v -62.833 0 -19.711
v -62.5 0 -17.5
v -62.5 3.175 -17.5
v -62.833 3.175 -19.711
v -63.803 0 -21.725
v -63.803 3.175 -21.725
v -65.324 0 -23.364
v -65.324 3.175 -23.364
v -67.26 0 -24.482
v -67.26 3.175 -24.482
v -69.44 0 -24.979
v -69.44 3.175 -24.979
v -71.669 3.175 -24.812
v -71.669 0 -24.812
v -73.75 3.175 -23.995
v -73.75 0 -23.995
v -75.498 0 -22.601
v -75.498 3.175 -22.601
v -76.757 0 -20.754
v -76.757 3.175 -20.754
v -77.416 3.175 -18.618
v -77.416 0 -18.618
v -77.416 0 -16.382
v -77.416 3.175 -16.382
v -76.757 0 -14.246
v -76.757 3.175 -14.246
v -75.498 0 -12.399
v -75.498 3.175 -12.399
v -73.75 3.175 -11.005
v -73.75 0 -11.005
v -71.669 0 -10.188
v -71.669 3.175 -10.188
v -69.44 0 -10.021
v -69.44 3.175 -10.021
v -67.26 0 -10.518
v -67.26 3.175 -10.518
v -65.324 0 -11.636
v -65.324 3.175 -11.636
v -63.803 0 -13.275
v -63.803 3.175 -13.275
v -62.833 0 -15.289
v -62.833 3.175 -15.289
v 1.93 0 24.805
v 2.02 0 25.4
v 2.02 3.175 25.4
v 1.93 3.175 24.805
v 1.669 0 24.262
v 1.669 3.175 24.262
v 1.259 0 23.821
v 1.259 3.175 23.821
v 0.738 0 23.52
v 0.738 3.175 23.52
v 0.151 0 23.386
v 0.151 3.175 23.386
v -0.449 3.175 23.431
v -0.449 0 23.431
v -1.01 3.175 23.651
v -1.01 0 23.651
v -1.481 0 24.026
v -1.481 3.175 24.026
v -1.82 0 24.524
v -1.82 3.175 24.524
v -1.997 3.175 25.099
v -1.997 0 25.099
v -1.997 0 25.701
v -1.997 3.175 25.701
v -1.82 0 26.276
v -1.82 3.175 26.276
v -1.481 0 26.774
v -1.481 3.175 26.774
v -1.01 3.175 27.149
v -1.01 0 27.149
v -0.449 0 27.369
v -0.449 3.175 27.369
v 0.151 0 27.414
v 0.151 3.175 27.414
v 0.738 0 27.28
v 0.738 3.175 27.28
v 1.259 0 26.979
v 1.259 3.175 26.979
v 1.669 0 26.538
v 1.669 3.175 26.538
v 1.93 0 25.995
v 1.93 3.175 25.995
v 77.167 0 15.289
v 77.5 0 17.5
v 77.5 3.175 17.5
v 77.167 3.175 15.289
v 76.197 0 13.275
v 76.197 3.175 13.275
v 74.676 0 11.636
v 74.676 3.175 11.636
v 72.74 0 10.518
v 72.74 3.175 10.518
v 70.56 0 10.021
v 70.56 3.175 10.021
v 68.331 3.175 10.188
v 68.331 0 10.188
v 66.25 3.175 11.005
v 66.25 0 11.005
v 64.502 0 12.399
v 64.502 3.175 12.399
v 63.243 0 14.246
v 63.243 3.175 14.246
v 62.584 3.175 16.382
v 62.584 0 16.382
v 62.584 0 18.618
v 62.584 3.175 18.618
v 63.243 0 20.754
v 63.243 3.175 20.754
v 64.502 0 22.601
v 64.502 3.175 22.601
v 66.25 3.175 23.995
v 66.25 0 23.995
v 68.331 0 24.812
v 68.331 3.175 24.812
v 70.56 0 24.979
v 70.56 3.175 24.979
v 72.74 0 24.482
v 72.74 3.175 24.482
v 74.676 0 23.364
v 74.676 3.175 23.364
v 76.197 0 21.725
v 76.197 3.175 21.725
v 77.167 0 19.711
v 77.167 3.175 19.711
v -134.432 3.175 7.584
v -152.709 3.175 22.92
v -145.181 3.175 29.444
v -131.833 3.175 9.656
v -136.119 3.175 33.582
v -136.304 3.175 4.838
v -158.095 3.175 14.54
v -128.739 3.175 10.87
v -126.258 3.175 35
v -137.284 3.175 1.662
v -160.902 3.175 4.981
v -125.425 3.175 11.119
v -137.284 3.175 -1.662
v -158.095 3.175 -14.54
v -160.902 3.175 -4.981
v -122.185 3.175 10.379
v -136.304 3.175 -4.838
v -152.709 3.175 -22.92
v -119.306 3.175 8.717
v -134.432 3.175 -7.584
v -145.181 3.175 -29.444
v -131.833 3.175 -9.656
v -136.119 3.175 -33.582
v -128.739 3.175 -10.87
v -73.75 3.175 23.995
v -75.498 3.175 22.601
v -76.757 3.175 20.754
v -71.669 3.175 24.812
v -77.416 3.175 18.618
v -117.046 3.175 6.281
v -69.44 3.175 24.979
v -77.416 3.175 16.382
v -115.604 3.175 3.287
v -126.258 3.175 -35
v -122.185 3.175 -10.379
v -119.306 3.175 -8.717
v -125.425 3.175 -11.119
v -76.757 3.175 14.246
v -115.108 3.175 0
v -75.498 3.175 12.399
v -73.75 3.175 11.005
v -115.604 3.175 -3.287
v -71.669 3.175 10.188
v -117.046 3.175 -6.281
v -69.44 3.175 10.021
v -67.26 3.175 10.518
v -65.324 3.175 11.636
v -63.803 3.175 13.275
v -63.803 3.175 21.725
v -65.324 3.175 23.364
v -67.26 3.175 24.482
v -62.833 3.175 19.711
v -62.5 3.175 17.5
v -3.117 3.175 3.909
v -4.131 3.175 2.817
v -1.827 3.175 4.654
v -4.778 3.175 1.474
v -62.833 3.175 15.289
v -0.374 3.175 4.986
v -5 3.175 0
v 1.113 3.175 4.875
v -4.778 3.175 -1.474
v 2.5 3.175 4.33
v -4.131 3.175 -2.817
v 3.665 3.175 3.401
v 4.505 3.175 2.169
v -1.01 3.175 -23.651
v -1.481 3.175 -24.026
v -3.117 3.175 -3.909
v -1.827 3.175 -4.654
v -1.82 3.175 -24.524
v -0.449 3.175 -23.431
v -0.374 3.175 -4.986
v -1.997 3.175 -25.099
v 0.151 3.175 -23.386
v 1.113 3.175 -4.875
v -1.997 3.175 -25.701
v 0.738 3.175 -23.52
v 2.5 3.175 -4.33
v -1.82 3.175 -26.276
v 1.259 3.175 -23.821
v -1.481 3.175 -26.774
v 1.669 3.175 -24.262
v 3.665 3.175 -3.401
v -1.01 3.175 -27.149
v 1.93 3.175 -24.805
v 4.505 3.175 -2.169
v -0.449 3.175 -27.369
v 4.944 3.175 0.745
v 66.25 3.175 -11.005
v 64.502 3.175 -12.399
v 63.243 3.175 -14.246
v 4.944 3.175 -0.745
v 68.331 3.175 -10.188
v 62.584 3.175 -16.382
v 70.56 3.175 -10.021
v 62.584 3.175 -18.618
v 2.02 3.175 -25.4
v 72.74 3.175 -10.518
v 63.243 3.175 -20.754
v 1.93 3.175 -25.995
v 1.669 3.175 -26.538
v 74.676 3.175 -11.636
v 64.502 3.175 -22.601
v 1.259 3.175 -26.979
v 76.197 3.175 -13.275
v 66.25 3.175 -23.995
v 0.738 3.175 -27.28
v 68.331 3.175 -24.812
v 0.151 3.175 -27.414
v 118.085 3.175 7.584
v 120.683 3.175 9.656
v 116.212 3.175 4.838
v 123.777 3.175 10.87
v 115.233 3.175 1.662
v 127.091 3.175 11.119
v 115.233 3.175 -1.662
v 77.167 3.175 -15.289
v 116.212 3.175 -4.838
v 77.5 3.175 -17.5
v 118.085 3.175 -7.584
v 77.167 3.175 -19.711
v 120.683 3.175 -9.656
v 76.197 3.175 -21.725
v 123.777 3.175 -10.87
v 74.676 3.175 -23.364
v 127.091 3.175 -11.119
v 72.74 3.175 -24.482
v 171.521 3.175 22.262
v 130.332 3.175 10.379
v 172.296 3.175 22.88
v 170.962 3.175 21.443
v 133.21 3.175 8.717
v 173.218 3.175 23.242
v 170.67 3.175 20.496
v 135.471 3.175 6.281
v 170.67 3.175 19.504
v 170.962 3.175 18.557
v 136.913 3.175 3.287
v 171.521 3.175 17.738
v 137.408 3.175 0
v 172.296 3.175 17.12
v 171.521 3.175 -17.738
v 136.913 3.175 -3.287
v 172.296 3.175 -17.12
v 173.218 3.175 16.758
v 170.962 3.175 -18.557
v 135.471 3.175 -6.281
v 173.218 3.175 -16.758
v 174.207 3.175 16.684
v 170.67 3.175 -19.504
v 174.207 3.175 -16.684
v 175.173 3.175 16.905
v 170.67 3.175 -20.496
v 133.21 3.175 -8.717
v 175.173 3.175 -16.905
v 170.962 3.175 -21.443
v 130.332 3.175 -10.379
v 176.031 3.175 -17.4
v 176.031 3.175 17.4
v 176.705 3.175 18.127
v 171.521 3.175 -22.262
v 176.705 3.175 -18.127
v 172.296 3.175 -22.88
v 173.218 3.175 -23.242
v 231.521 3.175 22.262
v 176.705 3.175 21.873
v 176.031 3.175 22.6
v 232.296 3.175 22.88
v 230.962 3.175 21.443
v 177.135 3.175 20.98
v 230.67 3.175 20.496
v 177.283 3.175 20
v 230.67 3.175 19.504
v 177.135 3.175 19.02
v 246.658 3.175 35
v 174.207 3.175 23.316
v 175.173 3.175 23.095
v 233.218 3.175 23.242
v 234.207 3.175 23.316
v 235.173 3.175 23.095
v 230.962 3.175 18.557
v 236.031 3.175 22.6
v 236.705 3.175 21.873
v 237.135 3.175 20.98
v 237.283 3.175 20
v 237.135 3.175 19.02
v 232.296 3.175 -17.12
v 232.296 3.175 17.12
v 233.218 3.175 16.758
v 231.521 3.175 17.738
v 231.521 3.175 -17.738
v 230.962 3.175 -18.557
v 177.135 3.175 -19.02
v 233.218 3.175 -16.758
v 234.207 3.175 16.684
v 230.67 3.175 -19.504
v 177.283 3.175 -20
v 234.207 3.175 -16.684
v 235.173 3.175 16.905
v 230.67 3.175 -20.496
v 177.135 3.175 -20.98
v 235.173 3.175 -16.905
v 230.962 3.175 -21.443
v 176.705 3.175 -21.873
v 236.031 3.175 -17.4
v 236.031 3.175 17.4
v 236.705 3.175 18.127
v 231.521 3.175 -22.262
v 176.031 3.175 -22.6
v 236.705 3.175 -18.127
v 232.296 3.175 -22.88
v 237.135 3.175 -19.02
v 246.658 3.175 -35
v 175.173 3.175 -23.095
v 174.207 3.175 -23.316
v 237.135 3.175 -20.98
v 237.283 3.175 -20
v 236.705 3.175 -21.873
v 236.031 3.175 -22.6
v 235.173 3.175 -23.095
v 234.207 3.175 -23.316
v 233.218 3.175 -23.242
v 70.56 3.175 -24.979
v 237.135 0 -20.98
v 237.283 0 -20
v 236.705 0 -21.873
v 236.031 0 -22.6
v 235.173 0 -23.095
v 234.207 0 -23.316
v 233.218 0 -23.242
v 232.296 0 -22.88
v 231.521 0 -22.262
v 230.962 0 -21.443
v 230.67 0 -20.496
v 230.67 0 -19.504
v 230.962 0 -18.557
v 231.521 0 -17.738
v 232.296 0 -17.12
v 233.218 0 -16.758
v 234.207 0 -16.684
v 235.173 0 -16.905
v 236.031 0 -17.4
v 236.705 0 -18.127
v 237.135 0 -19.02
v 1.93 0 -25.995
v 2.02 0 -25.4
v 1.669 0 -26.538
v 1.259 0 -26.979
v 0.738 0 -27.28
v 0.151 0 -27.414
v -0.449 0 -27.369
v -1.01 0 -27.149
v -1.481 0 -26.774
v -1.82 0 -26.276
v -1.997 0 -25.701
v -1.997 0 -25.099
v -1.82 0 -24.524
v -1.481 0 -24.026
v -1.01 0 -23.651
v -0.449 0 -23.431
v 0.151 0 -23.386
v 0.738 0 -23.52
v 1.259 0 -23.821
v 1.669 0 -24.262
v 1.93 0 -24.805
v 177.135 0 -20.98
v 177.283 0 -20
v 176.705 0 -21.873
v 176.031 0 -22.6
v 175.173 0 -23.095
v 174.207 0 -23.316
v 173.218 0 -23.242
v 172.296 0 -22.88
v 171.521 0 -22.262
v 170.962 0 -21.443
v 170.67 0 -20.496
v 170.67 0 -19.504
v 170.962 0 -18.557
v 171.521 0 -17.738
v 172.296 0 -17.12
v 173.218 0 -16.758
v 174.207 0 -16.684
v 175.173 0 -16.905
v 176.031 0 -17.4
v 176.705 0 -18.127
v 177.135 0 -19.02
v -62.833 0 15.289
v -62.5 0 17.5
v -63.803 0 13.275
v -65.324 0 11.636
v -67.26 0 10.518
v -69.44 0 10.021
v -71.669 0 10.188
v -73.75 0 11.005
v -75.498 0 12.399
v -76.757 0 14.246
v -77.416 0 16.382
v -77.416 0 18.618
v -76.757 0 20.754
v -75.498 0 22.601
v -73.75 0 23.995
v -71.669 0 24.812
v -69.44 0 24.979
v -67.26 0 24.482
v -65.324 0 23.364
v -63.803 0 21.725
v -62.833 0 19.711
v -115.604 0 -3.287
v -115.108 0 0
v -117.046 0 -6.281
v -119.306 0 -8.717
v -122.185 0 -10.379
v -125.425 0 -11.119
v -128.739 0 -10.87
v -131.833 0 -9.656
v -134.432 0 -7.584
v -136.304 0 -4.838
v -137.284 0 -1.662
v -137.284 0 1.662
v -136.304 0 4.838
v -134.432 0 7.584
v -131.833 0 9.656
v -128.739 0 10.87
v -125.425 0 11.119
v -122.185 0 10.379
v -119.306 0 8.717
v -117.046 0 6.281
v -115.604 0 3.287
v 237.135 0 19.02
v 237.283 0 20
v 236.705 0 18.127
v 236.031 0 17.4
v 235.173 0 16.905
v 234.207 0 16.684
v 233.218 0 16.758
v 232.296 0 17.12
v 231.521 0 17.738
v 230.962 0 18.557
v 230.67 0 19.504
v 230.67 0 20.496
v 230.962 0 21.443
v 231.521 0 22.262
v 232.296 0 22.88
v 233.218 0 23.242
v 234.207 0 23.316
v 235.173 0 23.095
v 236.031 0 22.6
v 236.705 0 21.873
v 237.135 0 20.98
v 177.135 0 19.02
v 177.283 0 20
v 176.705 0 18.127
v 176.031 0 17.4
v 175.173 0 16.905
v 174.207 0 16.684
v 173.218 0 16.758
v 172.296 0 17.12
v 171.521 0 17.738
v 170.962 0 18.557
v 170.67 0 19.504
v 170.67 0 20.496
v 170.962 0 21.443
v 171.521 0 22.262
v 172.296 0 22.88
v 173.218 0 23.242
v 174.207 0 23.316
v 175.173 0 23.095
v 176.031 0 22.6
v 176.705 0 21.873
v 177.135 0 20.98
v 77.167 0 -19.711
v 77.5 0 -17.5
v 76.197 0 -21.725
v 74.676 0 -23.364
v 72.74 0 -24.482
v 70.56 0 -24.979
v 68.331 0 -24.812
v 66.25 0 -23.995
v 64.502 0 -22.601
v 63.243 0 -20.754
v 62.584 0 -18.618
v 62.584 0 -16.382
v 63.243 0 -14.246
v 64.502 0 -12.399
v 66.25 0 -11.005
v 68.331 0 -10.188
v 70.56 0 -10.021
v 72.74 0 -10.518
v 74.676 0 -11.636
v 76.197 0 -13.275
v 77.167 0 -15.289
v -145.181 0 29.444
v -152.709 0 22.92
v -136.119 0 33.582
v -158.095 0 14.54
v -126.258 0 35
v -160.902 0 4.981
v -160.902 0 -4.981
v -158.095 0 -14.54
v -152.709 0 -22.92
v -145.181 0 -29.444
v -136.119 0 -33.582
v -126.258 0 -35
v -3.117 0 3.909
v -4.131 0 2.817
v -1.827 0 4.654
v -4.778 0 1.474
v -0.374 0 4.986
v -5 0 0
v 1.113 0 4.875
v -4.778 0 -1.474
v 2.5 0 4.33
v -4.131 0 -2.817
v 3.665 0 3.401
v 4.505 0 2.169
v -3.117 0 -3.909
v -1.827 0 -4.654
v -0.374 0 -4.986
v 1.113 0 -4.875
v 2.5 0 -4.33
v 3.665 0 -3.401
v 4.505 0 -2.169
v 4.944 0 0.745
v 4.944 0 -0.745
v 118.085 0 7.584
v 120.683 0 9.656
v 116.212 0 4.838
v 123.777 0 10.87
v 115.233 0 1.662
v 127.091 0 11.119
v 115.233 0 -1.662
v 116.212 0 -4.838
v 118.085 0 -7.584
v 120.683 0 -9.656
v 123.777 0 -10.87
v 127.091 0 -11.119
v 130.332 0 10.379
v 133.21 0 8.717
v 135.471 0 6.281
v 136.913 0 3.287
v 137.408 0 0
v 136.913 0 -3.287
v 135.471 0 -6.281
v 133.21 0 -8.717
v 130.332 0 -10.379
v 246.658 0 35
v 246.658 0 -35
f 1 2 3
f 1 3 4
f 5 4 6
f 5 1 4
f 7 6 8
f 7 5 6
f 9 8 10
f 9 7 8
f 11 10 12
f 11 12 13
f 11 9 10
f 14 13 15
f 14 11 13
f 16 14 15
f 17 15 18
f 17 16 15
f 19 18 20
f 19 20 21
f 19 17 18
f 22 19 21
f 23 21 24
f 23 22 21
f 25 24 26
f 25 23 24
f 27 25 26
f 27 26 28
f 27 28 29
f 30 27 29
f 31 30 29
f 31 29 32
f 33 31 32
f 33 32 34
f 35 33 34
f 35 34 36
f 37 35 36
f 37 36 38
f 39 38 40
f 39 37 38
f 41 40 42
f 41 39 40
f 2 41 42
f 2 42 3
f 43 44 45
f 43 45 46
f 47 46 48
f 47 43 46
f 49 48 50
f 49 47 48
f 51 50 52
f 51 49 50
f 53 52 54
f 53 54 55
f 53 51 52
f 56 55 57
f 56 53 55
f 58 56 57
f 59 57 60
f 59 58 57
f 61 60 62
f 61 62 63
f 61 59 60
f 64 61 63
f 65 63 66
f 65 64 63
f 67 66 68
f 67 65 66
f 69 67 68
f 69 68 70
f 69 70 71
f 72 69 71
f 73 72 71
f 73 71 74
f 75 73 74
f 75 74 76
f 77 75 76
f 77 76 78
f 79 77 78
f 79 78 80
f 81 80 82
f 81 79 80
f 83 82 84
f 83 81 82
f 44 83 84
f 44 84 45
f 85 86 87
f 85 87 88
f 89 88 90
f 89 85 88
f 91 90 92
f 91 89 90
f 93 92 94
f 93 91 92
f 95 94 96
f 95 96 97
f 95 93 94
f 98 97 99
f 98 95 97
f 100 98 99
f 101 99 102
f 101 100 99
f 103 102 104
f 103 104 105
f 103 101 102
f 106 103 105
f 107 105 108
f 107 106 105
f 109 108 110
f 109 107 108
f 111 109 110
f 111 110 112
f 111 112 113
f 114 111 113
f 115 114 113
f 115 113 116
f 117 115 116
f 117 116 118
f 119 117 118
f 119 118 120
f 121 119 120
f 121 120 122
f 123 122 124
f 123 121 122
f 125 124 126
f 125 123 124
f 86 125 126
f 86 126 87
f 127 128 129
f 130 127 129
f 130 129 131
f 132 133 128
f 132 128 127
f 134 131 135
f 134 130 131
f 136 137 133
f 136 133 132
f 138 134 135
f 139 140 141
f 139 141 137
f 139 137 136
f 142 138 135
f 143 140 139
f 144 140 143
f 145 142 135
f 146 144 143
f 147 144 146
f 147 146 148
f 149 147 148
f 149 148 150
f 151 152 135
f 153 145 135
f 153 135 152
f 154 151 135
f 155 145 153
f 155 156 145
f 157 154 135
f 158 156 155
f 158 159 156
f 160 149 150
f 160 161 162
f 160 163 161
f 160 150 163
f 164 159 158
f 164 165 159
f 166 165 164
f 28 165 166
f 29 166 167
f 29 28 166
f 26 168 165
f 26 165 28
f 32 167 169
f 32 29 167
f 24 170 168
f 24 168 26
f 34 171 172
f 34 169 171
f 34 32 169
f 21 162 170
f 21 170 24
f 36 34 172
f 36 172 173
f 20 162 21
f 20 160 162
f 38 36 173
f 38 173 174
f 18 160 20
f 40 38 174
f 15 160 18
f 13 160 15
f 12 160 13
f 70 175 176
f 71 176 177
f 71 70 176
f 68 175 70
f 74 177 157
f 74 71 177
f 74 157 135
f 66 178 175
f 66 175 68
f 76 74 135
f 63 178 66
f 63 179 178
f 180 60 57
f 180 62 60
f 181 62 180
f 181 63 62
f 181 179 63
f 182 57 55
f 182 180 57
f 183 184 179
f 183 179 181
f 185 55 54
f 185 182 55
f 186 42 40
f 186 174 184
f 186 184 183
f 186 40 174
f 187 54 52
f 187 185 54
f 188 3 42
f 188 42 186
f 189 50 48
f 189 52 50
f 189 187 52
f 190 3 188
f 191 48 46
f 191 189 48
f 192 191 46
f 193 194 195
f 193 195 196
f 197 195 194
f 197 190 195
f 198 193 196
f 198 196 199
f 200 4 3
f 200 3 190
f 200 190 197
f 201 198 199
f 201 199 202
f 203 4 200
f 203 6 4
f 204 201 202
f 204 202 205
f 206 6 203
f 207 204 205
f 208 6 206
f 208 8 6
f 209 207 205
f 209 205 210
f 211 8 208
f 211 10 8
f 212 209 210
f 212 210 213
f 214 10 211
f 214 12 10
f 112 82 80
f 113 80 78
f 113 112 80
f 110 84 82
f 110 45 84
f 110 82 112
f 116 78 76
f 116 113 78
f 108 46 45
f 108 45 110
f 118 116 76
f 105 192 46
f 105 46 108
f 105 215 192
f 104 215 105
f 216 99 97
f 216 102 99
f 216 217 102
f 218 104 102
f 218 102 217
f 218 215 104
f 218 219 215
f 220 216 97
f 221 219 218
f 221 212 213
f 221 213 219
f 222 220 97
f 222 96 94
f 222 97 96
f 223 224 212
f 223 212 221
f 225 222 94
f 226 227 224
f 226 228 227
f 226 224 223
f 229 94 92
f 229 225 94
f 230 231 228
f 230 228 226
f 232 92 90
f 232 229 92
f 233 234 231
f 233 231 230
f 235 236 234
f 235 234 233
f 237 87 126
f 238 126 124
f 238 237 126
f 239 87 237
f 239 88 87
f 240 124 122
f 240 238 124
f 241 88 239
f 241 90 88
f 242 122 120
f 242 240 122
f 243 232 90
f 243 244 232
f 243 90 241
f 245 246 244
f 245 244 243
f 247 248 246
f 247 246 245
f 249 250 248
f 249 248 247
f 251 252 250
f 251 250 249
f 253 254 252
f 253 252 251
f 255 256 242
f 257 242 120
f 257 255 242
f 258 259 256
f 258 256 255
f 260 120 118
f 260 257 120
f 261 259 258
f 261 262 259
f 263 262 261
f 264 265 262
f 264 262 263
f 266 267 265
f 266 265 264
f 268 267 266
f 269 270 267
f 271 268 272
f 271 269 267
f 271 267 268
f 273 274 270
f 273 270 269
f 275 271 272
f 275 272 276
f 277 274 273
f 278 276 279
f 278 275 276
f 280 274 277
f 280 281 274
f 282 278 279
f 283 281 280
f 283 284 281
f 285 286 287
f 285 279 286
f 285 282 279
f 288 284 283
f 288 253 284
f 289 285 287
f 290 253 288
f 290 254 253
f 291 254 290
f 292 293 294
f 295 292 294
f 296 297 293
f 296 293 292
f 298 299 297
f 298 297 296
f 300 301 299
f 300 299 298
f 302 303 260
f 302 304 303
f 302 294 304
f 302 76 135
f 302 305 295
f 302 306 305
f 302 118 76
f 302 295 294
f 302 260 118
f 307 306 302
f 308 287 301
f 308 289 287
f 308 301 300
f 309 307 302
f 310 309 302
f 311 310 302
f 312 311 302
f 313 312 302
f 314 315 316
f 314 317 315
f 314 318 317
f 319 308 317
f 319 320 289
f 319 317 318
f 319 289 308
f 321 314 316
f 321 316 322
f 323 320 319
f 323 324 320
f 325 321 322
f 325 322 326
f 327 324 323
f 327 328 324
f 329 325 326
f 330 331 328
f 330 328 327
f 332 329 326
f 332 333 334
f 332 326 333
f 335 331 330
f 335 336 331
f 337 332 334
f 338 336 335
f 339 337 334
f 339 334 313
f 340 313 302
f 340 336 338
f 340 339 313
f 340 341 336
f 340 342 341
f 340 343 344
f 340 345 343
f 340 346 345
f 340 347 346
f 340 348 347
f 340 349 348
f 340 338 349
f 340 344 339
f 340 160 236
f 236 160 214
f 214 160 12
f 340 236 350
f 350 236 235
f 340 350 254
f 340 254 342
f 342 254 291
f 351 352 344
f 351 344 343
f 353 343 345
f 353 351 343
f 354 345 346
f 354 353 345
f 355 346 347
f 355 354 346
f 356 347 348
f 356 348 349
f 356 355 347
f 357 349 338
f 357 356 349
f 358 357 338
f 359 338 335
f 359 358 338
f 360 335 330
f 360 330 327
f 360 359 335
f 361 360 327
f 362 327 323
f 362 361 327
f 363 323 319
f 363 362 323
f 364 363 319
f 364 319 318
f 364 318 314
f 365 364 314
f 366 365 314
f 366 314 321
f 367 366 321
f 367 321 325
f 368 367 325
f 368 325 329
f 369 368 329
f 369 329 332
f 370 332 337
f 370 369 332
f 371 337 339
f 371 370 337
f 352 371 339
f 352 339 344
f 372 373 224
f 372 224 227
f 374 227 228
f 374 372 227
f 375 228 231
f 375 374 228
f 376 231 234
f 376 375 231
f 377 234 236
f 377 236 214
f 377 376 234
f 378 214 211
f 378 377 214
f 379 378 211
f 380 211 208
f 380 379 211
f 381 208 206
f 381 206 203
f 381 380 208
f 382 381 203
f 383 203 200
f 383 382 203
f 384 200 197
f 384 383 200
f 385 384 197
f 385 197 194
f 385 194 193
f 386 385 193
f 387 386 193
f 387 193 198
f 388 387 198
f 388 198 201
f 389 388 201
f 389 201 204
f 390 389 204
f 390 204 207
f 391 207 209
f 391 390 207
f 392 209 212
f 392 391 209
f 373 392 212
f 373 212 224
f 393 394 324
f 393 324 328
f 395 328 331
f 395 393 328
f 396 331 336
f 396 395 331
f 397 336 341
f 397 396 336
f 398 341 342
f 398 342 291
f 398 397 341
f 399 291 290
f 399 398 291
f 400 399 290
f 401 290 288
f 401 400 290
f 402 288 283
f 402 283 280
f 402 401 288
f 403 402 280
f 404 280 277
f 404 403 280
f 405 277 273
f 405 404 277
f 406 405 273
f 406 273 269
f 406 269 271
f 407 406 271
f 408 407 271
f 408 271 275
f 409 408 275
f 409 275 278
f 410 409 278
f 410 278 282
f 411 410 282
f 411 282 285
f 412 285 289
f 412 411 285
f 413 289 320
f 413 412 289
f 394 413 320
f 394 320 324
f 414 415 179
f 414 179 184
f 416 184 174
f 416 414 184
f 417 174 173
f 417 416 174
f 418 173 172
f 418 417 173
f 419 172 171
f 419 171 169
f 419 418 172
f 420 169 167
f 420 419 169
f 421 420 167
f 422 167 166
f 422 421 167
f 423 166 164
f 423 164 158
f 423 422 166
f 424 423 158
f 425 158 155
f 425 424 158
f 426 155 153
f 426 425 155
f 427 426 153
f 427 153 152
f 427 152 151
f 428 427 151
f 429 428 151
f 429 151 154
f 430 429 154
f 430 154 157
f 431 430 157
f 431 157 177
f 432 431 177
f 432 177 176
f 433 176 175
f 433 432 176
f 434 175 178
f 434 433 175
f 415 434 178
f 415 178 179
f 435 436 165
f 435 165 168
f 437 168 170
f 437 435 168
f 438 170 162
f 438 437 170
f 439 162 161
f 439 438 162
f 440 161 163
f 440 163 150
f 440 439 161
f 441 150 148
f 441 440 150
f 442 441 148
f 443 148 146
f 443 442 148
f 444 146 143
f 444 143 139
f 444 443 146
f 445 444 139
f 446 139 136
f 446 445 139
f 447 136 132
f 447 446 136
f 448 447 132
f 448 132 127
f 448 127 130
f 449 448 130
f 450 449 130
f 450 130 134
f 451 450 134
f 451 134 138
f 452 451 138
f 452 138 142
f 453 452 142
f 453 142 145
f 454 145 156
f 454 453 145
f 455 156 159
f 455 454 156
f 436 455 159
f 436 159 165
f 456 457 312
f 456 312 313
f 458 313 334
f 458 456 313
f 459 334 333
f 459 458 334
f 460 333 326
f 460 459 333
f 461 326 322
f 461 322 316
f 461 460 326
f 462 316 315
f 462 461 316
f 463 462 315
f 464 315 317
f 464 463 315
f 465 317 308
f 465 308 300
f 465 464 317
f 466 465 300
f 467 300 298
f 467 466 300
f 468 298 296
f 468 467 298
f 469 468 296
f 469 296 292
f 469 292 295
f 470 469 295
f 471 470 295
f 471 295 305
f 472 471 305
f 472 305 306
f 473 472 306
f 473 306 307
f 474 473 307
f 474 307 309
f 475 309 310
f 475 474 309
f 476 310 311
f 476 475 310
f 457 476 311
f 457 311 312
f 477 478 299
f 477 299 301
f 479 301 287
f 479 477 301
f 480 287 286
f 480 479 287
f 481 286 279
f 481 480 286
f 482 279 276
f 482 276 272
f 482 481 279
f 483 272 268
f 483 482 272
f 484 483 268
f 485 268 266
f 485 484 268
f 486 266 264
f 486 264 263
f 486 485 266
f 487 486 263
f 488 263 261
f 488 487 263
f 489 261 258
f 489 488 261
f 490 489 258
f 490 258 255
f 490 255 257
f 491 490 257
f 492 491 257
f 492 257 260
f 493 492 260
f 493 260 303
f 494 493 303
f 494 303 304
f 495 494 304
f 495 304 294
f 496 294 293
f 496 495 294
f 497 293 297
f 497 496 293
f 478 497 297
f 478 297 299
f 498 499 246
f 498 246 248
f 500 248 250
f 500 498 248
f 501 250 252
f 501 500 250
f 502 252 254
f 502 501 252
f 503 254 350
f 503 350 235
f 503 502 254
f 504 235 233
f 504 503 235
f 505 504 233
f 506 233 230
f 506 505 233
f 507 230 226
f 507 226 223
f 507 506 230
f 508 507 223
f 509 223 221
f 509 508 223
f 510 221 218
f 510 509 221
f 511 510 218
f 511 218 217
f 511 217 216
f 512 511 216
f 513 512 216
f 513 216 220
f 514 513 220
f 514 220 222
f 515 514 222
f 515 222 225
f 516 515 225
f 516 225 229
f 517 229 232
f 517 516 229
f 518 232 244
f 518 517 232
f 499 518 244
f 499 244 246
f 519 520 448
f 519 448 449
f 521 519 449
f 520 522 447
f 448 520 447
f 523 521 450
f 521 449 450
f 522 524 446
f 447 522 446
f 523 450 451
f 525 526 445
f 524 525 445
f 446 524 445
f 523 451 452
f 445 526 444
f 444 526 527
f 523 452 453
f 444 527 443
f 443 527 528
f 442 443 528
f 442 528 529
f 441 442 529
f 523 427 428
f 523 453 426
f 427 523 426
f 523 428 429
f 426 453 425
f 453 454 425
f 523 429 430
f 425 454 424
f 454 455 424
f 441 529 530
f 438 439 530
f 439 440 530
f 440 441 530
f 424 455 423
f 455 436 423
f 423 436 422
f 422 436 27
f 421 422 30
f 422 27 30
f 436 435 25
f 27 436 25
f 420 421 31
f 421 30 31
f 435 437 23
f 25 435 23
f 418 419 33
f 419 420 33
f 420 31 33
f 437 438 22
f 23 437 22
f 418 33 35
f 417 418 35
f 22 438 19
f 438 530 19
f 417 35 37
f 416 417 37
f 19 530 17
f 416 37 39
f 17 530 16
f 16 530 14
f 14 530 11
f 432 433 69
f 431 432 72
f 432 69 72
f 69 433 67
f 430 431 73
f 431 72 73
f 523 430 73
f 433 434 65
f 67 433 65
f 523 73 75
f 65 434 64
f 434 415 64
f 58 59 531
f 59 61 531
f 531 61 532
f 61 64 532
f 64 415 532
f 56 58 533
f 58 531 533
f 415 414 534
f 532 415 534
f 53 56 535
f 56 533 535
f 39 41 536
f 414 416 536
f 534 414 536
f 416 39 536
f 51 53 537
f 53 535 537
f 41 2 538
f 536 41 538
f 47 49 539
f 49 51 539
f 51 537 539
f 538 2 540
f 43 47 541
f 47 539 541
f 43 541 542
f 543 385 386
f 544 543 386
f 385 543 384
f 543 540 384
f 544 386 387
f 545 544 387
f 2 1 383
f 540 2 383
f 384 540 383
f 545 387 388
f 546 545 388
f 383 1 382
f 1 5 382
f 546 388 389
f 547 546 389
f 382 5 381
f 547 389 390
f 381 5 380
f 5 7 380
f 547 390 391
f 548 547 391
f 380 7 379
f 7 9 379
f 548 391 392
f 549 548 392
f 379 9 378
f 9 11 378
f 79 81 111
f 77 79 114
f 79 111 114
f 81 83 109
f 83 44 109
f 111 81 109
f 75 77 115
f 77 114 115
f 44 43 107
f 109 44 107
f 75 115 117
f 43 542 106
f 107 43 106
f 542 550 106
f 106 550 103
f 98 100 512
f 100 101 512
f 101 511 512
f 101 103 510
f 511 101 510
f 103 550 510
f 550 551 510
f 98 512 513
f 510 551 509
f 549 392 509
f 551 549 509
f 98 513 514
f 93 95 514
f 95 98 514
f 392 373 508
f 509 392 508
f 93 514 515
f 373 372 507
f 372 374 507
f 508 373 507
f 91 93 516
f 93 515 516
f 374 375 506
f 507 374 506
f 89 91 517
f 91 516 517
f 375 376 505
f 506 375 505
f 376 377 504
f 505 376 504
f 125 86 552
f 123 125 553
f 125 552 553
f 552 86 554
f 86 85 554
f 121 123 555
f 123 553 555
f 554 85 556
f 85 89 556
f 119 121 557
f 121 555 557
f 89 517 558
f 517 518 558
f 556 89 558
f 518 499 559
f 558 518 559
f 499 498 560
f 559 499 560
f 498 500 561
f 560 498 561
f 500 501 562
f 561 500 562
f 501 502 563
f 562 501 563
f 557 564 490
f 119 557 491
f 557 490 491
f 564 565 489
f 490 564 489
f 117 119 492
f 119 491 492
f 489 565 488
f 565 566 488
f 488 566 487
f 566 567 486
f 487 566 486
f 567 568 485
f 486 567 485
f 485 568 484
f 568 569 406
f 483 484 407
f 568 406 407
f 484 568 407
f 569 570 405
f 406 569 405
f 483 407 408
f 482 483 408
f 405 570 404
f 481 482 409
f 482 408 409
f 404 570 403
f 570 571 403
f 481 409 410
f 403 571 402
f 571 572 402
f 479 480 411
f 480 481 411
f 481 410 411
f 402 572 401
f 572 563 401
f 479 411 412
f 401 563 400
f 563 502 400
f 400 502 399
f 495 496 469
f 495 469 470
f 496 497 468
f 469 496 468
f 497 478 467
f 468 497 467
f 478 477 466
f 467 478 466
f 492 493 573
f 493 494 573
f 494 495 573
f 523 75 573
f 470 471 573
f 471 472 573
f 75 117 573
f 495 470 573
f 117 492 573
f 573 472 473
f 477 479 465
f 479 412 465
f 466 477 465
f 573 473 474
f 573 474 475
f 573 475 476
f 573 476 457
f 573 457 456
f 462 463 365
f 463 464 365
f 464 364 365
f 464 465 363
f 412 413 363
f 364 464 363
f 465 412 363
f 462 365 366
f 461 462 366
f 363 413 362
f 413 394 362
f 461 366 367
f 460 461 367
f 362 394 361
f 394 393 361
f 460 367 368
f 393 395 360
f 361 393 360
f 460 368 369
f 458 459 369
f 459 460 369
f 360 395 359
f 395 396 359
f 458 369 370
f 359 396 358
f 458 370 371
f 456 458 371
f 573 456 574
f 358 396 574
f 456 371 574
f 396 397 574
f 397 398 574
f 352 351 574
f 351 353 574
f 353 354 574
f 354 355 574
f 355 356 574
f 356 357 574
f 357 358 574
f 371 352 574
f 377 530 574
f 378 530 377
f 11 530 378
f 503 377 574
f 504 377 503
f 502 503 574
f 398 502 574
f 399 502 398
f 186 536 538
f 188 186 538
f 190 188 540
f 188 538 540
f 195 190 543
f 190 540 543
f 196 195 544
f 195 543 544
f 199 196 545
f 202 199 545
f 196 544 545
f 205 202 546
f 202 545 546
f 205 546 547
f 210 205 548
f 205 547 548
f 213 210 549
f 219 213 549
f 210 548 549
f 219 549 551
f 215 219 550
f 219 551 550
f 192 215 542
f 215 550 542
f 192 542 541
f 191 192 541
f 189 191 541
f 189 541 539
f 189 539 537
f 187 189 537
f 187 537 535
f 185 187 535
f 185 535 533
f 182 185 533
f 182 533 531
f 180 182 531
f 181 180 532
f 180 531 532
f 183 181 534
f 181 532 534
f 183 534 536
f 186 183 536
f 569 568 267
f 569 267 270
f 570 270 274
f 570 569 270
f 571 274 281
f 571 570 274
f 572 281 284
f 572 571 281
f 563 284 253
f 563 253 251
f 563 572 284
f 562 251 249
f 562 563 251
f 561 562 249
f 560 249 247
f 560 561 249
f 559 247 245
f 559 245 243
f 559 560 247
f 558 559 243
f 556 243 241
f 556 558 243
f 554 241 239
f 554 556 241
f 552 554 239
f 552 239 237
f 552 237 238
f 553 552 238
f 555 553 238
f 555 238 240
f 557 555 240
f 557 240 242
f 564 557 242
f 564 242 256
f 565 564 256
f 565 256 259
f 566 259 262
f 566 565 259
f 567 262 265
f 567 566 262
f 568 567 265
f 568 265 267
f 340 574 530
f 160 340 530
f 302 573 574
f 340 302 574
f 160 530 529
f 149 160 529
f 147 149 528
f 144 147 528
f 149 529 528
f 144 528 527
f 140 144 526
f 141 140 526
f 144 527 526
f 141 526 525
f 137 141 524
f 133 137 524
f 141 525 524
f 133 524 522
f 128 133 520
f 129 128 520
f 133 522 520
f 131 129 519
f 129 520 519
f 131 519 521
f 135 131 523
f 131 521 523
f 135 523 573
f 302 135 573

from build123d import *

# Parameters (mm, degrees)
SKETCH1_R           = 11.15
SKETCH1_R_2         = 7.5
SKETCH1_R_3         = 2.02
SKETCH1_R_4         = 3.325
BOSS_EXTRUDE1_DEPTH = 3.175


with BuildPart() as part:
    # Sketch1 → Boss-Extrude1 (new body)
    with BuildSketch(Plane(origin=(0, 0, 0), x_dir=(1, 0, 0), z_dir=(0, 1, 0))):
        with BuildLine():
            ThreePointArc((-126.258214395, 35), (-161.258214395, 0), (-126.258214395, -35))
            Line((-126.258214395, -35), (246.658214395, -35))
            Line((246.658214395, -35), (246.658214395, 35))
            Line((246.658214395, 35), (-126.258214395, 35))
        make_face()
        with Locations((-126.258214395, 0)):
            Circle(SKETCH1_R, mode=Mode.SUBTRACT)
        with Locations((-70, -17.5)):
            Circle(SKETCH1_R_2, mode=Mode.SUBTRACT)
        with Locations((0, -25.4)):
            Circle(SKETCH1_R_3, mode=Mode.SUBTRACT)
        with BuildLine():
            ThreePointArc((5, 0), (0, -5), (-5, 0))
            ThreePointArc((-5, 0), (0, 5), (5, 0))
        make_face(mode=Mode.SUBTRACT)
        with Locations((70, -17.5)):
            Circle(SKETCH1_R_2, mode=Mode.SUBTRACT)
        with Locations((173.958214395, -20)):
            Circle(SKETCH1_R_4, mode=Mode.SUBTRACT)
        with Locations((233.958214395, -20)):
            Circle(SKETCH1_R_4, mode=Mode.SUBTRACT)
        with Locations((-70, 17.5)):
            Circle(SKETCH1_R_2, mode=Mode.SUBTRACT)
        with Locations((0, 25.4)):
            Circle(SKETCH1_R_3, mode=Mode.SUBTRACT)
        with Locations((126.258214395, 0)):
            Circle(SKETCH1_R, mode=Mode.SUBTRACT)
        with Locations((70, 17.5)):
            Circle(SKETCH1_R_2, mode=Mode.SUBTRACT)
        with Locations((173.958214395, 20)):
            Circle(SKETCH1_R_4, mode=Mode.SUBTRACT)
        with Locations((233.958214395, 20)):
            Circle(SKETCH1_R_4, mode=Mode.SUBTRACT)
    extrude(amount=BOSS_EXTRUDE1_DEPTH)


solid = part.part
